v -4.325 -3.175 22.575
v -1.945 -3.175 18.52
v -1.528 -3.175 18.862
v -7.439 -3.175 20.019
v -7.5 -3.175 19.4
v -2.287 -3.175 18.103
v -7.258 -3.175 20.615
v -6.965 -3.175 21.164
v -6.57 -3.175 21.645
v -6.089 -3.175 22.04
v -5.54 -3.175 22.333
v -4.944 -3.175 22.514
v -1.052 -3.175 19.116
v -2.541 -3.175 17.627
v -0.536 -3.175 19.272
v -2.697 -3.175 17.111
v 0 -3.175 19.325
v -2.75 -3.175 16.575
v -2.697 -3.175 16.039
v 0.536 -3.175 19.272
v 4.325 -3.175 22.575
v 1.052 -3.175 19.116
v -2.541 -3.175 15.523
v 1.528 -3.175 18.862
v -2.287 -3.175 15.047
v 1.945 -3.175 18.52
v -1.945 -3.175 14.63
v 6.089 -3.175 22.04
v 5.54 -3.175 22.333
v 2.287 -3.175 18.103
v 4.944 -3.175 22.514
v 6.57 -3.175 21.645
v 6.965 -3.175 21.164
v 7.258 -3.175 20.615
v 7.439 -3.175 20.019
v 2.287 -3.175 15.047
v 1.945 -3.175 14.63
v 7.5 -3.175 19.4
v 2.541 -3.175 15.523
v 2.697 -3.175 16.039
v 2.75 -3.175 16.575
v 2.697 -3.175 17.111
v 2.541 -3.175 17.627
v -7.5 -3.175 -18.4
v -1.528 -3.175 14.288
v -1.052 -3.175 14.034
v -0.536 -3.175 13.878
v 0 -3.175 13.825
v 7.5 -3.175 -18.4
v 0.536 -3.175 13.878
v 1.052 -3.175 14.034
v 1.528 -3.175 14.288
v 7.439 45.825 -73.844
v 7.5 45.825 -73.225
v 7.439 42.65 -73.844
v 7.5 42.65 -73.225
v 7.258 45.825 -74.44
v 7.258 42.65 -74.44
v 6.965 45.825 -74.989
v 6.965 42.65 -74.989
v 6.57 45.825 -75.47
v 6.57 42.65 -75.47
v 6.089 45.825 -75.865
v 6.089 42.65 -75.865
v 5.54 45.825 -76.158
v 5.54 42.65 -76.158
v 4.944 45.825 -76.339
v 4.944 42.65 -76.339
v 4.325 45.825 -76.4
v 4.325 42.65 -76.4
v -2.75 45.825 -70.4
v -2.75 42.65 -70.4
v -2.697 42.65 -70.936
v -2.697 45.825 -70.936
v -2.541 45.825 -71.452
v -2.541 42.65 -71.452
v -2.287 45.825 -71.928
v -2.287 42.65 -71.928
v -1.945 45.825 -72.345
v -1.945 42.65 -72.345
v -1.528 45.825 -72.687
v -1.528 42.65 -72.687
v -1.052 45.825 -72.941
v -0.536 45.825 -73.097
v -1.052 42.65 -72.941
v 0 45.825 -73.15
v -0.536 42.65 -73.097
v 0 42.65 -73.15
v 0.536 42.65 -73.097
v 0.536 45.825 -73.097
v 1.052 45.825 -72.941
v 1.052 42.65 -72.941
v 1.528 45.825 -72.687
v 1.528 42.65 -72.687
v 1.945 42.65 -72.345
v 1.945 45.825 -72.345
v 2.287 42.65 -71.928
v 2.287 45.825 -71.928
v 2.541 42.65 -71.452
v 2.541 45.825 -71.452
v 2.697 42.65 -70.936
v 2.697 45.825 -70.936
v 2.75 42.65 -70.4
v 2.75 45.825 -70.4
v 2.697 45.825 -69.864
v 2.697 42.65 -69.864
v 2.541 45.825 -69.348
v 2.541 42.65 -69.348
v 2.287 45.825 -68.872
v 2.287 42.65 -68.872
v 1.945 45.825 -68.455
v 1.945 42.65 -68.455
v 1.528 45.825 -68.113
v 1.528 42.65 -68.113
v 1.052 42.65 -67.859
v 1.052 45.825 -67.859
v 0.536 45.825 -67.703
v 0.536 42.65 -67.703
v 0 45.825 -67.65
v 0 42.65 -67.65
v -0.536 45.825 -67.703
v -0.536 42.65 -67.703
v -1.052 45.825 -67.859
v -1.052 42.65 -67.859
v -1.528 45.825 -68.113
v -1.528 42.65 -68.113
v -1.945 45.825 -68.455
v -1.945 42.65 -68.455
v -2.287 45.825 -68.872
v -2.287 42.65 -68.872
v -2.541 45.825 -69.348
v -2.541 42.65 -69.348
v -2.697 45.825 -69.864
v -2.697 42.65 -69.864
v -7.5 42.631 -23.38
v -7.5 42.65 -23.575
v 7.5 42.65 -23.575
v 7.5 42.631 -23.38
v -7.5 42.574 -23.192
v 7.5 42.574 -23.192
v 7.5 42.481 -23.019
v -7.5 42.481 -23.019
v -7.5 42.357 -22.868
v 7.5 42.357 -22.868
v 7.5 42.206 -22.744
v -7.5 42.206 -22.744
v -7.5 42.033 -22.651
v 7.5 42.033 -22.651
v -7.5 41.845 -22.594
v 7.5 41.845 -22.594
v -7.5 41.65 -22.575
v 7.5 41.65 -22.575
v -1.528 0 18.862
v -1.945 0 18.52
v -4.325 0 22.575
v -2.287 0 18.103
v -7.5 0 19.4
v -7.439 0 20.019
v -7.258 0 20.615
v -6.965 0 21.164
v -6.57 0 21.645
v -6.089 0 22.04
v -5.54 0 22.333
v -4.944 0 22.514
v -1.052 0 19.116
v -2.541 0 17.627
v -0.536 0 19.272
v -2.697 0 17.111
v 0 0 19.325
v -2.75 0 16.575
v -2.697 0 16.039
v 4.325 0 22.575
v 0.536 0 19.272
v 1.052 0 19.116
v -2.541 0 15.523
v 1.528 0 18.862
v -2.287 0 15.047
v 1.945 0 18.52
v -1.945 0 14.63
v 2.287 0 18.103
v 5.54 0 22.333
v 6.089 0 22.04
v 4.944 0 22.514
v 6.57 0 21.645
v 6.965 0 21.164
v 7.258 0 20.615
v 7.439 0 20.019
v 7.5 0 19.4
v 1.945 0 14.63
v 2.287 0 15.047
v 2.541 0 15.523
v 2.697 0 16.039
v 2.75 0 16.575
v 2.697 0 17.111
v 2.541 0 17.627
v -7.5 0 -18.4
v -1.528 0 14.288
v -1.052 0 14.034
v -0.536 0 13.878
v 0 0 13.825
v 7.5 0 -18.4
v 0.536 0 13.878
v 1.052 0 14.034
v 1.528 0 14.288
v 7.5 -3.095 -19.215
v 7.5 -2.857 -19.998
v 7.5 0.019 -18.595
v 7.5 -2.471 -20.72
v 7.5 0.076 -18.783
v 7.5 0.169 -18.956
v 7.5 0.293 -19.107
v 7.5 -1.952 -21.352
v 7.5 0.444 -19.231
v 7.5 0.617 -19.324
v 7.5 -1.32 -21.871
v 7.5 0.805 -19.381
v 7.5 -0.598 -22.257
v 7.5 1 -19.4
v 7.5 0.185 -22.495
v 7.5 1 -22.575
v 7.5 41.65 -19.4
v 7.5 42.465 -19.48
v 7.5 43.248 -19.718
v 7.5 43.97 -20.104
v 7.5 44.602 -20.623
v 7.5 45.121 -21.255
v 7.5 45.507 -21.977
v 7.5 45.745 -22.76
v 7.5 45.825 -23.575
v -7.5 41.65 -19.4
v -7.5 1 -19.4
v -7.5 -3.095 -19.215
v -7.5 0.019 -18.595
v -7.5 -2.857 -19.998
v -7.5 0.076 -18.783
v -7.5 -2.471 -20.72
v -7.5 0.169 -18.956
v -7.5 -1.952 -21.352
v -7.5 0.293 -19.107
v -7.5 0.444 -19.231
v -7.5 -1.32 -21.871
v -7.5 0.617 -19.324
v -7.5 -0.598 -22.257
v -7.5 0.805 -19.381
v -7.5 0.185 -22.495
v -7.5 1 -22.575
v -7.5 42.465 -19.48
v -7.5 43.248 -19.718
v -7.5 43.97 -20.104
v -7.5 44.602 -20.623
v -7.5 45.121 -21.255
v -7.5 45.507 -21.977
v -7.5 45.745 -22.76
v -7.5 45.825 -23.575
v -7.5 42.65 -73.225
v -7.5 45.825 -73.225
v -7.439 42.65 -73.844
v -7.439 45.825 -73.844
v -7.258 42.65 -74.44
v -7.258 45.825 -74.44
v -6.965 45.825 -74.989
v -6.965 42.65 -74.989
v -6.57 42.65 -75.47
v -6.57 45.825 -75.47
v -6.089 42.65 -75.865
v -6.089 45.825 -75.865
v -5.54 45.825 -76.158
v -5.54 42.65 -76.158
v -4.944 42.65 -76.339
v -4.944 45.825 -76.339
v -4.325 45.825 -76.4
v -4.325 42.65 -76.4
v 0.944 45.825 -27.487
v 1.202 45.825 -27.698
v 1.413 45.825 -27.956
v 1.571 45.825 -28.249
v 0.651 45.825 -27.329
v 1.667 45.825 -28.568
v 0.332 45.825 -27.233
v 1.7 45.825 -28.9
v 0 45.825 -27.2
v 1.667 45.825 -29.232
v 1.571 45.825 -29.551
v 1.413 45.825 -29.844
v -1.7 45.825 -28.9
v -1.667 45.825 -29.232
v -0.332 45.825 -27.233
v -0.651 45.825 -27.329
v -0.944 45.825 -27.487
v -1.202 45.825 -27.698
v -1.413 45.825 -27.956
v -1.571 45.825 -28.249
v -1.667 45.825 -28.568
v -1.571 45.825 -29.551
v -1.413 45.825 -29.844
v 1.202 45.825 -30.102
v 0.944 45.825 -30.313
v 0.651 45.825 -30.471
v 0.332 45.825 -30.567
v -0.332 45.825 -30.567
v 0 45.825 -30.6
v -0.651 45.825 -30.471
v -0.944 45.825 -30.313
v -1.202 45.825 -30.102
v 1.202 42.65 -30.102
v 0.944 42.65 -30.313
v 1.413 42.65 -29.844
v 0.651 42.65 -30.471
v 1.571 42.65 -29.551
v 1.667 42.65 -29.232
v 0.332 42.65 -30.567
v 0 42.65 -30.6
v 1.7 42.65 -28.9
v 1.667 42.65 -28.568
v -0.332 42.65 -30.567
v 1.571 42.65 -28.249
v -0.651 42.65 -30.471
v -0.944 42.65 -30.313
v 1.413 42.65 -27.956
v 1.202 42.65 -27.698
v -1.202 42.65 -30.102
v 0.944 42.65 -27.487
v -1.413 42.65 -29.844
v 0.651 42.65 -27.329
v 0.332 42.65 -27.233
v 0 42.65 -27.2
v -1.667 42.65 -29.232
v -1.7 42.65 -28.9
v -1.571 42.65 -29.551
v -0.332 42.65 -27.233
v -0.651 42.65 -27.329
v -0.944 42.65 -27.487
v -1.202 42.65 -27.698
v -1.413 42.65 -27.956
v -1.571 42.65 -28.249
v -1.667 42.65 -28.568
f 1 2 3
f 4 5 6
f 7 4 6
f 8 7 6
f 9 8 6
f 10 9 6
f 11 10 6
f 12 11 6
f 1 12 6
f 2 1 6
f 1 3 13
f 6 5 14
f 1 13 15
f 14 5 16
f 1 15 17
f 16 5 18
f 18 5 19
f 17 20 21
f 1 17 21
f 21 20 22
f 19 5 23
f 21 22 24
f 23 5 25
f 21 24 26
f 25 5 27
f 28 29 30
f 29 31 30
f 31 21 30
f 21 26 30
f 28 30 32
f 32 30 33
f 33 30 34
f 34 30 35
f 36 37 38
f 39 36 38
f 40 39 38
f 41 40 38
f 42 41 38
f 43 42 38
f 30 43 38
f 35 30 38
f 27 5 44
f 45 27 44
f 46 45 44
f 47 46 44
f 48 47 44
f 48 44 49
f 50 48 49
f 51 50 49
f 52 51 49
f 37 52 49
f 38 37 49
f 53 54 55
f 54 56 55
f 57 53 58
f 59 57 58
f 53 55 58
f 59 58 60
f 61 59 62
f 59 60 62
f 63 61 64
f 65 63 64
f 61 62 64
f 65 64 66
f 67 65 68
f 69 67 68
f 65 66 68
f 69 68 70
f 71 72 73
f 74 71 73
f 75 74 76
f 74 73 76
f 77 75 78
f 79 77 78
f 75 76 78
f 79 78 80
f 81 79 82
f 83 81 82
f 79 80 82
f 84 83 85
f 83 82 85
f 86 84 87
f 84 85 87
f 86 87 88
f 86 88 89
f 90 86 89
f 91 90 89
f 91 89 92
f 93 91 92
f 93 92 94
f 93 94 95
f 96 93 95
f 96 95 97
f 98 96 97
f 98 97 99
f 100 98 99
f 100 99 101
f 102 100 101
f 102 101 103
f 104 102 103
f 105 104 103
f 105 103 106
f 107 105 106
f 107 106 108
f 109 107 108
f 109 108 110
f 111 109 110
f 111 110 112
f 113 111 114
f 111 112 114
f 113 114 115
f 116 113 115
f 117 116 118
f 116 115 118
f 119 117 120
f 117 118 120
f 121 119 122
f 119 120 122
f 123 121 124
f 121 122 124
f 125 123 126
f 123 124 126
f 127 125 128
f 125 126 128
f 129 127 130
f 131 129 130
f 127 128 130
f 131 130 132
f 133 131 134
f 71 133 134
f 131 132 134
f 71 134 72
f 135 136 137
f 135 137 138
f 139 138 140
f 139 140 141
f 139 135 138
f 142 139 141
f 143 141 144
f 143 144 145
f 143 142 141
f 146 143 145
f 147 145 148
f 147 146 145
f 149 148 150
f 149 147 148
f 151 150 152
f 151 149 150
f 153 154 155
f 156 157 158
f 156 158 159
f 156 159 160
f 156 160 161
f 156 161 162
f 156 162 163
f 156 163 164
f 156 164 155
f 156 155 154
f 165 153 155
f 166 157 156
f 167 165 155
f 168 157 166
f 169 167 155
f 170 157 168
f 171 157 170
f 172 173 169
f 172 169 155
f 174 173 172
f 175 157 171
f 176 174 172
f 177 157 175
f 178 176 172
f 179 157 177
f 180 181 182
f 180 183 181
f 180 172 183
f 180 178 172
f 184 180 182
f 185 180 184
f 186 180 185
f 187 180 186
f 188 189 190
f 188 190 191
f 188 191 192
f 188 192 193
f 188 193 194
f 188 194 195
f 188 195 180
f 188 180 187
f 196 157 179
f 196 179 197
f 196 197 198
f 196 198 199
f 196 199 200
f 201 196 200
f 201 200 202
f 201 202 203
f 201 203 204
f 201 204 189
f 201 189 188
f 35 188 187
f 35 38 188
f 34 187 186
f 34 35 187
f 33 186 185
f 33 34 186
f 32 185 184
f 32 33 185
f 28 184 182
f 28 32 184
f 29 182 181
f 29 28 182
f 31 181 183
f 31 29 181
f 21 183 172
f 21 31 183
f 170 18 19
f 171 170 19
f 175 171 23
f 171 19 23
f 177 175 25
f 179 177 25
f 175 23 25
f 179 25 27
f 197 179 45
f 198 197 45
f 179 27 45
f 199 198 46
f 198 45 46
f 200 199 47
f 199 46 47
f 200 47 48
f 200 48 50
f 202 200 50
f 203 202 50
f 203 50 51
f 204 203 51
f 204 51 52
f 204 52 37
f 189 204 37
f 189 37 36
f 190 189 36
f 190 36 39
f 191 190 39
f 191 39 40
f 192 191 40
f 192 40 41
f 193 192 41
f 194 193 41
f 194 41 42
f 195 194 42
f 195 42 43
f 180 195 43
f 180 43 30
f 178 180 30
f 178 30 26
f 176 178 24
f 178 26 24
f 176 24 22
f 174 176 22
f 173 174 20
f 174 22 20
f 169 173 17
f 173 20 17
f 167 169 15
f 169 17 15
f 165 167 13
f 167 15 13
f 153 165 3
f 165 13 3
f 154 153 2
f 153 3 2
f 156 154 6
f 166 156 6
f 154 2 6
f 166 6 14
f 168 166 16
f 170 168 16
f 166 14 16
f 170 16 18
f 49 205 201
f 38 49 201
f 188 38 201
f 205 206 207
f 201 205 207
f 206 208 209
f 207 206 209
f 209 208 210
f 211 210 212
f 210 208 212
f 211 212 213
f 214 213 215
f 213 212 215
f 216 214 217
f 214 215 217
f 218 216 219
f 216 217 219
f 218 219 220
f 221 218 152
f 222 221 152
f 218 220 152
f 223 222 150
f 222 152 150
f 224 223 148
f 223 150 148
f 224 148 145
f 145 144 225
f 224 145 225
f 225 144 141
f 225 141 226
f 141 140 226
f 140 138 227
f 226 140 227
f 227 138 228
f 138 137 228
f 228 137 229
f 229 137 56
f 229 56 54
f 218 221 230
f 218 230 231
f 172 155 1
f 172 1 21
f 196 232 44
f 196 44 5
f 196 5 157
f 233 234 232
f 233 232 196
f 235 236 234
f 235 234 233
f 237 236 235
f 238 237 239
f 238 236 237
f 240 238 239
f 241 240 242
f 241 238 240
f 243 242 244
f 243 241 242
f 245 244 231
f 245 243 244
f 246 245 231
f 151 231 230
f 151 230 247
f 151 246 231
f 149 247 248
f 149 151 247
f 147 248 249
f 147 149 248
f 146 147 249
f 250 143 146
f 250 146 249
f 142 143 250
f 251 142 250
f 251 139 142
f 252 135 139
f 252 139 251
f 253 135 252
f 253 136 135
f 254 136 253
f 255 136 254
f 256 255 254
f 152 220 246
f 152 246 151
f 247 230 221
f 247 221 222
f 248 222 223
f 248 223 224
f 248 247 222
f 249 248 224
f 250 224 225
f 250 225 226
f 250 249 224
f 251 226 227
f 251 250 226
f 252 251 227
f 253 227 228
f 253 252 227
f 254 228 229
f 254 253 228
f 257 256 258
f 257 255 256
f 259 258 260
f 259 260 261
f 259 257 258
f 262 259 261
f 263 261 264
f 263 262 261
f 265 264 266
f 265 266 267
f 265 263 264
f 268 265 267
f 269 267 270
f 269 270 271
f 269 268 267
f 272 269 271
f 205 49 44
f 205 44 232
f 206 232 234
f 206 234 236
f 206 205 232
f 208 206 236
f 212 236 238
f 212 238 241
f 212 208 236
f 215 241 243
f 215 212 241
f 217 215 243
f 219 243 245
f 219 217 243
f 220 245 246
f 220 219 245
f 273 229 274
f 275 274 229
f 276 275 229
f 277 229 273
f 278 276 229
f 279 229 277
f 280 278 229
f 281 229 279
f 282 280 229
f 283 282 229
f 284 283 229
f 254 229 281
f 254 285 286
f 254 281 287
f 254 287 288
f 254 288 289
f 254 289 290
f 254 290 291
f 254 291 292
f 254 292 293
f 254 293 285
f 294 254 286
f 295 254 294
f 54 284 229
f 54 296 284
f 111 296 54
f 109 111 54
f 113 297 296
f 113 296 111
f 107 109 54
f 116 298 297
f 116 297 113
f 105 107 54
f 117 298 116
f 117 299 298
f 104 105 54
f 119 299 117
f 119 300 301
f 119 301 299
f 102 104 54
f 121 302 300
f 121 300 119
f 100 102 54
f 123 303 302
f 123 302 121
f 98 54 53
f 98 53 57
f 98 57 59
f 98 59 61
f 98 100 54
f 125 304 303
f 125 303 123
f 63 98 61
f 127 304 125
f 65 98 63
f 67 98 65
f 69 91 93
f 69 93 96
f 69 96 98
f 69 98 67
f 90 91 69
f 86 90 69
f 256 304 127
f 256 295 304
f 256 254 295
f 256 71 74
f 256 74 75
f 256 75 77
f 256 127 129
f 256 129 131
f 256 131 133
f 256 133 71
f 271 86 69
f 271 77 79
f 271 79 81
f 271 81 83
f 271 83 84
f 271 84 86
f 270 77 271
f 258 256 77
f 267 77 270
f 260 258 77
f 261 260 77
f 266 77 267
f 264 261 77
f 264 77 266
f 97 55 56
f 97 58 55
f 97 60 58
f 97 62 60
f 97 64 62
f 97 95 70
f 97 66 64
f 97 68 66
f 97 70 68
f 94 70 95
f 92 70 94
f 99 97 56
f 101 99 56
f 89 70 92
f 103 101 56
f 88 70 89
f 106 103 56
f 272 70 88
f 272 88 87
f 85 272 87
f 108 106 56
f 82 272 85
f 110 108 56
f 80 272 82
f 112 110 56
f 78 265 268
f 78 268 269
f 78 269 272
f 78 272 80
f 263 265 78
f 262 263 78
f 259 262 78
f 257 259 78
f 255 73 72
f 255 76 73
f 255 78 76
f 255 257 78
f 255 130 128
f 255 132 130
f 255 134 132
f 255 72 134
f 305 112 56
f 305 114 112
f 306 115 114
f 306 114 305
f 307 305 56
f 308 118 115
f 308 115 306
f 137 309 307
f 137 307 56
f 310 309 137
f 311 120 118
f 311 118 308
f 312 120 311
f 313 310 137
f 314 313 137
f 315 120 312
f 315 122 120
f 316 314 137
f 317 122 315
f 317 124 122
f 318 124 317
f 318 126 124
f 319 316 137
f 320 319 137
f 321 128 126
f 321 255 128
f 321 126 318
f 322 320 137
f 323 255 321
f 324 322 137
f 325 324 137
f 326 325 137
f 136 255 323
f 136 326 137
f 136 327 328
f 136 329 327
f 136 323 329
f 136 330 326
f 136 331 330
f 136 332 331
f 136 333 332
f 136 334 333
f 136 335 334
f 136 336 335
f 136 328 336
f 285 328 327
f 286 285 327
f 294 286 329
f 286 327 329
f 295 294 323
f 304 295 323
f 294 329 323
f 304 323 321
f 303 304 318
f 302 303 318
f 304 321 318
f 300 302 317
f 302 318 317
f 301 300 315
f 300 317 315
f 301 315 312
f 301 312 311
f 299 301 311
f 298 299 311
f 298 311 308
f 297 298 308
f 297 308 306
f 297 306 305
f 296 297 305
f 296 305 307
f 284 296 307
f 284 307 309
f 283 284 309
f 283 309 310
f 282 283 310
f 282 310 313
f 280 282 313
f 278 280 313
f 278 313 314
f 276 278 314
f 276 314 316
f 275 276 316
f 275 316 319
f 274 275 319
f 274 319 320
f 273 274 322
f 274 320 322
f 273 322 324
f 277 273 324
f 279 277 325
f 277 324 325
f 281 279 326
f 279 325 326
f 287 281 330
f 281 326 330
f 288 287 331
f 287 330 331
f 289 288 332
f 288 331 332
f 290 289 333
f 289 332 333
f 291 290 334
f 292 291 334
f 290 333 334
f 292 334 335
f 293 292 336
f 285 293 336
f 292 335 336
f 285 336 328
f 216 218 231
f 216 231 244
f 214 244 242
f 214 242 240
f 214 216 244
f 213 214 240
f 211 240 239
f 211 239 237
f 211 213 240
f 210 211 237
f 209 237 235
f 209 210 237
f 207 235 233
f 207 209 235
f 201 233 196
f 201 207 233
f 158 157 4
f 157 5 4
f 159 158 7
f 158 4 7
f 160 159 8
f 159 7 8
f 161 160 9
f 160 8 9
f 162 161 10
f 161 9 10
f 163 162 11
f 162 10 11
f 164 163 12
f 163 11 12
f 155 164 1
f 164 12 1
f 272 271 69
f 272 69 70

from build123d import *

# Parameters (mm, degrees)
SKETCH1_W                    = 15
SKETCH1_H                    = 45.15
BASE_FLANGE1_DEPTH           = 3.175
EDGE_FLANGE1_STRIP_W         = 14.7
EDGE_FLANGE1_STRIP_H         = 3.175
EDGE_FLANGE1_STRIP_CUT_DEPTH = 15
EDGE_FLANGE1_DEPTH           = 15
EDGE_FLANGE2_STRIP_W         = 14.7
EDGE_FLANGE2_STRIP_H         = 3.175
EDGE_FLANGE2_STRIP_CUT_DEPTH = 15
EDGE_FLANGE2_DEPTH           = 15
M5_CLEARANCE_HOLE2_D         = 5.5
M5_CLEARANCE_HOLE1_D         = 5.5
M3_CLEARANCE_HOLE1_D         = 3.4
FILLET1_R                    = 3.175


# Sheet-metal steps are written as plain solids
with BuildPart() as part:
    # Sketch1 → Base-Flange1 (new body)
    with BuildSketch(Plane(origin=(0, 0, 0), x_dir=(1, 0, 0), z_dir=(0, 1, 0))):
        Rectangle(SKETCH1_W, SKETCH1_H)
    extrude(amount=-BASE_FLANGE1_DEPTH)

    # Edge-Flange1 strip (across the edge) → Edge-Flange1 strip cut (cut)
    with BuildSketch(Plane(origin=(7.5, 0, -22.575), x_dir=(0, 0, 1), z_dir=(-1, 0, 0))):
        with Locations((-3.175, -1.5875)):
            Rectangle(EDGE_FLANGE1_STRIP_W, EDGE_FLANGE1_STRIP_H)
    extrude(amount=EDGE_FLANGE1_STRIP_CUT_DEPTH, mode=Mode.SUBTRACT)

    # Edge-Flange1 section (across the edge) → Edge-Flange1 (add)
    with BuildSketch(Plane(origin=(7.5, 0, -22.575), x_dir=(0, 0, 1), z_dir=(-1, 0, 0))):
        with BuildLine():
            Line((0, 1), (0, 45.825))
            Line((0, 45.825), (3.175, 45.825))
            Line((3.175, 45.825), (3.175, 1))
            ThreePointArc((3.175, 1), (3.467893219, 0.292893219), (4.175, 0))
            Line((4.175, 0), (4.175, -3.175))
            ThreePointArc((4.175, -3.175), (1.222829189, -1.952170811), (0, 1))
        make_face()
    extrude(amount=EDGE_FLANGE1_DEPTH)

    # Edge-Flange2 strip (across the edge) → Edge-Flange2 strip cut (cut)
    with BuildSketch(Plane(origin=(-7.5, 45.825, -22.575), x_dir=(0, -1, 0), z_dir=(1, 0, 0))):
        with Locations((-3.175, -1.5875)):
            Rectangle(EDGE_FLANGE2_STRIP_W, EDGE_FLANGE2_STRIP_H)
    extrude(amount=EDGE_FLANGE2_STRIP_CUT_DEPTH, mode=Mode.SUBTRACT)

    # Edge-Flange2 section (across the edge) → Edge-Flange2 (add)
    with BuildSketch(Plane(origin=(-7.5, 45.825, -22.575), x_dir=(0, -1, 0), z_dir=(1, 0, 0))):
        with BuildLine():
            Line((0, 1), (0, 53.825))
            Line((0, 53.825), (3.175, 53.825))
            Line((3.175, 53.825), (3.175, 1))
            ThreePointArc((3.175, 1), (3.467893219, 0.292893219), (4.175, 0))
            Line((4.175, 0), (4.175, -3.175))
            ThreePointArc((4.175, -3.175), (1.222829189, -1.952170811), (0, 1))
        make_face()
    extrude(amount=EDGE_FLANGE2_DEPTH)

    # M5 Clearance Hole2 (through all)
    with Locations(Plane(origin=(0, 0, 0), x_dir=(1, 0, 0), z_dir=(0, 1, 0))):
        with Locations((0, -16.575)):
            Hole(M5_CLEARANCE_HOLE2_D / 2)

    # M5 Clearance Hole1 (through all)
    with Locations(Plane(origin=(0, 45.825, 0), x_dir=(1, 0, 0), z_dir=(0, 1, 0))):
        with Locations((0, 70.4)):
            Hole(M5_CLEARANCE_HOLE1_D / 2)

    # M3 Clearance Hole1 (through all)
    with Locations(Plane(origin=(0, 45.825, 0), x_dir=(1, 0, 0), z_dir=(0, 1, 0))):
        with Locations((0, 28.9)):
            Hole(M3_CLEARANCE_HOLE1_D / 2)

    # Fillet1
    fillet1_edges = [part.edges().sort_by_distance(p)[0] for p in [
        (-7.5, 44.2375, -76.4),
        (7.5, 44.2375, -76.4),
        (7.5, -1.5875, 22.575),
        (-7.5, -1.5875, 22.575),
    ]]
    fillet(fillet1_edges, radius=FILLET1_R)


solid = part.part
